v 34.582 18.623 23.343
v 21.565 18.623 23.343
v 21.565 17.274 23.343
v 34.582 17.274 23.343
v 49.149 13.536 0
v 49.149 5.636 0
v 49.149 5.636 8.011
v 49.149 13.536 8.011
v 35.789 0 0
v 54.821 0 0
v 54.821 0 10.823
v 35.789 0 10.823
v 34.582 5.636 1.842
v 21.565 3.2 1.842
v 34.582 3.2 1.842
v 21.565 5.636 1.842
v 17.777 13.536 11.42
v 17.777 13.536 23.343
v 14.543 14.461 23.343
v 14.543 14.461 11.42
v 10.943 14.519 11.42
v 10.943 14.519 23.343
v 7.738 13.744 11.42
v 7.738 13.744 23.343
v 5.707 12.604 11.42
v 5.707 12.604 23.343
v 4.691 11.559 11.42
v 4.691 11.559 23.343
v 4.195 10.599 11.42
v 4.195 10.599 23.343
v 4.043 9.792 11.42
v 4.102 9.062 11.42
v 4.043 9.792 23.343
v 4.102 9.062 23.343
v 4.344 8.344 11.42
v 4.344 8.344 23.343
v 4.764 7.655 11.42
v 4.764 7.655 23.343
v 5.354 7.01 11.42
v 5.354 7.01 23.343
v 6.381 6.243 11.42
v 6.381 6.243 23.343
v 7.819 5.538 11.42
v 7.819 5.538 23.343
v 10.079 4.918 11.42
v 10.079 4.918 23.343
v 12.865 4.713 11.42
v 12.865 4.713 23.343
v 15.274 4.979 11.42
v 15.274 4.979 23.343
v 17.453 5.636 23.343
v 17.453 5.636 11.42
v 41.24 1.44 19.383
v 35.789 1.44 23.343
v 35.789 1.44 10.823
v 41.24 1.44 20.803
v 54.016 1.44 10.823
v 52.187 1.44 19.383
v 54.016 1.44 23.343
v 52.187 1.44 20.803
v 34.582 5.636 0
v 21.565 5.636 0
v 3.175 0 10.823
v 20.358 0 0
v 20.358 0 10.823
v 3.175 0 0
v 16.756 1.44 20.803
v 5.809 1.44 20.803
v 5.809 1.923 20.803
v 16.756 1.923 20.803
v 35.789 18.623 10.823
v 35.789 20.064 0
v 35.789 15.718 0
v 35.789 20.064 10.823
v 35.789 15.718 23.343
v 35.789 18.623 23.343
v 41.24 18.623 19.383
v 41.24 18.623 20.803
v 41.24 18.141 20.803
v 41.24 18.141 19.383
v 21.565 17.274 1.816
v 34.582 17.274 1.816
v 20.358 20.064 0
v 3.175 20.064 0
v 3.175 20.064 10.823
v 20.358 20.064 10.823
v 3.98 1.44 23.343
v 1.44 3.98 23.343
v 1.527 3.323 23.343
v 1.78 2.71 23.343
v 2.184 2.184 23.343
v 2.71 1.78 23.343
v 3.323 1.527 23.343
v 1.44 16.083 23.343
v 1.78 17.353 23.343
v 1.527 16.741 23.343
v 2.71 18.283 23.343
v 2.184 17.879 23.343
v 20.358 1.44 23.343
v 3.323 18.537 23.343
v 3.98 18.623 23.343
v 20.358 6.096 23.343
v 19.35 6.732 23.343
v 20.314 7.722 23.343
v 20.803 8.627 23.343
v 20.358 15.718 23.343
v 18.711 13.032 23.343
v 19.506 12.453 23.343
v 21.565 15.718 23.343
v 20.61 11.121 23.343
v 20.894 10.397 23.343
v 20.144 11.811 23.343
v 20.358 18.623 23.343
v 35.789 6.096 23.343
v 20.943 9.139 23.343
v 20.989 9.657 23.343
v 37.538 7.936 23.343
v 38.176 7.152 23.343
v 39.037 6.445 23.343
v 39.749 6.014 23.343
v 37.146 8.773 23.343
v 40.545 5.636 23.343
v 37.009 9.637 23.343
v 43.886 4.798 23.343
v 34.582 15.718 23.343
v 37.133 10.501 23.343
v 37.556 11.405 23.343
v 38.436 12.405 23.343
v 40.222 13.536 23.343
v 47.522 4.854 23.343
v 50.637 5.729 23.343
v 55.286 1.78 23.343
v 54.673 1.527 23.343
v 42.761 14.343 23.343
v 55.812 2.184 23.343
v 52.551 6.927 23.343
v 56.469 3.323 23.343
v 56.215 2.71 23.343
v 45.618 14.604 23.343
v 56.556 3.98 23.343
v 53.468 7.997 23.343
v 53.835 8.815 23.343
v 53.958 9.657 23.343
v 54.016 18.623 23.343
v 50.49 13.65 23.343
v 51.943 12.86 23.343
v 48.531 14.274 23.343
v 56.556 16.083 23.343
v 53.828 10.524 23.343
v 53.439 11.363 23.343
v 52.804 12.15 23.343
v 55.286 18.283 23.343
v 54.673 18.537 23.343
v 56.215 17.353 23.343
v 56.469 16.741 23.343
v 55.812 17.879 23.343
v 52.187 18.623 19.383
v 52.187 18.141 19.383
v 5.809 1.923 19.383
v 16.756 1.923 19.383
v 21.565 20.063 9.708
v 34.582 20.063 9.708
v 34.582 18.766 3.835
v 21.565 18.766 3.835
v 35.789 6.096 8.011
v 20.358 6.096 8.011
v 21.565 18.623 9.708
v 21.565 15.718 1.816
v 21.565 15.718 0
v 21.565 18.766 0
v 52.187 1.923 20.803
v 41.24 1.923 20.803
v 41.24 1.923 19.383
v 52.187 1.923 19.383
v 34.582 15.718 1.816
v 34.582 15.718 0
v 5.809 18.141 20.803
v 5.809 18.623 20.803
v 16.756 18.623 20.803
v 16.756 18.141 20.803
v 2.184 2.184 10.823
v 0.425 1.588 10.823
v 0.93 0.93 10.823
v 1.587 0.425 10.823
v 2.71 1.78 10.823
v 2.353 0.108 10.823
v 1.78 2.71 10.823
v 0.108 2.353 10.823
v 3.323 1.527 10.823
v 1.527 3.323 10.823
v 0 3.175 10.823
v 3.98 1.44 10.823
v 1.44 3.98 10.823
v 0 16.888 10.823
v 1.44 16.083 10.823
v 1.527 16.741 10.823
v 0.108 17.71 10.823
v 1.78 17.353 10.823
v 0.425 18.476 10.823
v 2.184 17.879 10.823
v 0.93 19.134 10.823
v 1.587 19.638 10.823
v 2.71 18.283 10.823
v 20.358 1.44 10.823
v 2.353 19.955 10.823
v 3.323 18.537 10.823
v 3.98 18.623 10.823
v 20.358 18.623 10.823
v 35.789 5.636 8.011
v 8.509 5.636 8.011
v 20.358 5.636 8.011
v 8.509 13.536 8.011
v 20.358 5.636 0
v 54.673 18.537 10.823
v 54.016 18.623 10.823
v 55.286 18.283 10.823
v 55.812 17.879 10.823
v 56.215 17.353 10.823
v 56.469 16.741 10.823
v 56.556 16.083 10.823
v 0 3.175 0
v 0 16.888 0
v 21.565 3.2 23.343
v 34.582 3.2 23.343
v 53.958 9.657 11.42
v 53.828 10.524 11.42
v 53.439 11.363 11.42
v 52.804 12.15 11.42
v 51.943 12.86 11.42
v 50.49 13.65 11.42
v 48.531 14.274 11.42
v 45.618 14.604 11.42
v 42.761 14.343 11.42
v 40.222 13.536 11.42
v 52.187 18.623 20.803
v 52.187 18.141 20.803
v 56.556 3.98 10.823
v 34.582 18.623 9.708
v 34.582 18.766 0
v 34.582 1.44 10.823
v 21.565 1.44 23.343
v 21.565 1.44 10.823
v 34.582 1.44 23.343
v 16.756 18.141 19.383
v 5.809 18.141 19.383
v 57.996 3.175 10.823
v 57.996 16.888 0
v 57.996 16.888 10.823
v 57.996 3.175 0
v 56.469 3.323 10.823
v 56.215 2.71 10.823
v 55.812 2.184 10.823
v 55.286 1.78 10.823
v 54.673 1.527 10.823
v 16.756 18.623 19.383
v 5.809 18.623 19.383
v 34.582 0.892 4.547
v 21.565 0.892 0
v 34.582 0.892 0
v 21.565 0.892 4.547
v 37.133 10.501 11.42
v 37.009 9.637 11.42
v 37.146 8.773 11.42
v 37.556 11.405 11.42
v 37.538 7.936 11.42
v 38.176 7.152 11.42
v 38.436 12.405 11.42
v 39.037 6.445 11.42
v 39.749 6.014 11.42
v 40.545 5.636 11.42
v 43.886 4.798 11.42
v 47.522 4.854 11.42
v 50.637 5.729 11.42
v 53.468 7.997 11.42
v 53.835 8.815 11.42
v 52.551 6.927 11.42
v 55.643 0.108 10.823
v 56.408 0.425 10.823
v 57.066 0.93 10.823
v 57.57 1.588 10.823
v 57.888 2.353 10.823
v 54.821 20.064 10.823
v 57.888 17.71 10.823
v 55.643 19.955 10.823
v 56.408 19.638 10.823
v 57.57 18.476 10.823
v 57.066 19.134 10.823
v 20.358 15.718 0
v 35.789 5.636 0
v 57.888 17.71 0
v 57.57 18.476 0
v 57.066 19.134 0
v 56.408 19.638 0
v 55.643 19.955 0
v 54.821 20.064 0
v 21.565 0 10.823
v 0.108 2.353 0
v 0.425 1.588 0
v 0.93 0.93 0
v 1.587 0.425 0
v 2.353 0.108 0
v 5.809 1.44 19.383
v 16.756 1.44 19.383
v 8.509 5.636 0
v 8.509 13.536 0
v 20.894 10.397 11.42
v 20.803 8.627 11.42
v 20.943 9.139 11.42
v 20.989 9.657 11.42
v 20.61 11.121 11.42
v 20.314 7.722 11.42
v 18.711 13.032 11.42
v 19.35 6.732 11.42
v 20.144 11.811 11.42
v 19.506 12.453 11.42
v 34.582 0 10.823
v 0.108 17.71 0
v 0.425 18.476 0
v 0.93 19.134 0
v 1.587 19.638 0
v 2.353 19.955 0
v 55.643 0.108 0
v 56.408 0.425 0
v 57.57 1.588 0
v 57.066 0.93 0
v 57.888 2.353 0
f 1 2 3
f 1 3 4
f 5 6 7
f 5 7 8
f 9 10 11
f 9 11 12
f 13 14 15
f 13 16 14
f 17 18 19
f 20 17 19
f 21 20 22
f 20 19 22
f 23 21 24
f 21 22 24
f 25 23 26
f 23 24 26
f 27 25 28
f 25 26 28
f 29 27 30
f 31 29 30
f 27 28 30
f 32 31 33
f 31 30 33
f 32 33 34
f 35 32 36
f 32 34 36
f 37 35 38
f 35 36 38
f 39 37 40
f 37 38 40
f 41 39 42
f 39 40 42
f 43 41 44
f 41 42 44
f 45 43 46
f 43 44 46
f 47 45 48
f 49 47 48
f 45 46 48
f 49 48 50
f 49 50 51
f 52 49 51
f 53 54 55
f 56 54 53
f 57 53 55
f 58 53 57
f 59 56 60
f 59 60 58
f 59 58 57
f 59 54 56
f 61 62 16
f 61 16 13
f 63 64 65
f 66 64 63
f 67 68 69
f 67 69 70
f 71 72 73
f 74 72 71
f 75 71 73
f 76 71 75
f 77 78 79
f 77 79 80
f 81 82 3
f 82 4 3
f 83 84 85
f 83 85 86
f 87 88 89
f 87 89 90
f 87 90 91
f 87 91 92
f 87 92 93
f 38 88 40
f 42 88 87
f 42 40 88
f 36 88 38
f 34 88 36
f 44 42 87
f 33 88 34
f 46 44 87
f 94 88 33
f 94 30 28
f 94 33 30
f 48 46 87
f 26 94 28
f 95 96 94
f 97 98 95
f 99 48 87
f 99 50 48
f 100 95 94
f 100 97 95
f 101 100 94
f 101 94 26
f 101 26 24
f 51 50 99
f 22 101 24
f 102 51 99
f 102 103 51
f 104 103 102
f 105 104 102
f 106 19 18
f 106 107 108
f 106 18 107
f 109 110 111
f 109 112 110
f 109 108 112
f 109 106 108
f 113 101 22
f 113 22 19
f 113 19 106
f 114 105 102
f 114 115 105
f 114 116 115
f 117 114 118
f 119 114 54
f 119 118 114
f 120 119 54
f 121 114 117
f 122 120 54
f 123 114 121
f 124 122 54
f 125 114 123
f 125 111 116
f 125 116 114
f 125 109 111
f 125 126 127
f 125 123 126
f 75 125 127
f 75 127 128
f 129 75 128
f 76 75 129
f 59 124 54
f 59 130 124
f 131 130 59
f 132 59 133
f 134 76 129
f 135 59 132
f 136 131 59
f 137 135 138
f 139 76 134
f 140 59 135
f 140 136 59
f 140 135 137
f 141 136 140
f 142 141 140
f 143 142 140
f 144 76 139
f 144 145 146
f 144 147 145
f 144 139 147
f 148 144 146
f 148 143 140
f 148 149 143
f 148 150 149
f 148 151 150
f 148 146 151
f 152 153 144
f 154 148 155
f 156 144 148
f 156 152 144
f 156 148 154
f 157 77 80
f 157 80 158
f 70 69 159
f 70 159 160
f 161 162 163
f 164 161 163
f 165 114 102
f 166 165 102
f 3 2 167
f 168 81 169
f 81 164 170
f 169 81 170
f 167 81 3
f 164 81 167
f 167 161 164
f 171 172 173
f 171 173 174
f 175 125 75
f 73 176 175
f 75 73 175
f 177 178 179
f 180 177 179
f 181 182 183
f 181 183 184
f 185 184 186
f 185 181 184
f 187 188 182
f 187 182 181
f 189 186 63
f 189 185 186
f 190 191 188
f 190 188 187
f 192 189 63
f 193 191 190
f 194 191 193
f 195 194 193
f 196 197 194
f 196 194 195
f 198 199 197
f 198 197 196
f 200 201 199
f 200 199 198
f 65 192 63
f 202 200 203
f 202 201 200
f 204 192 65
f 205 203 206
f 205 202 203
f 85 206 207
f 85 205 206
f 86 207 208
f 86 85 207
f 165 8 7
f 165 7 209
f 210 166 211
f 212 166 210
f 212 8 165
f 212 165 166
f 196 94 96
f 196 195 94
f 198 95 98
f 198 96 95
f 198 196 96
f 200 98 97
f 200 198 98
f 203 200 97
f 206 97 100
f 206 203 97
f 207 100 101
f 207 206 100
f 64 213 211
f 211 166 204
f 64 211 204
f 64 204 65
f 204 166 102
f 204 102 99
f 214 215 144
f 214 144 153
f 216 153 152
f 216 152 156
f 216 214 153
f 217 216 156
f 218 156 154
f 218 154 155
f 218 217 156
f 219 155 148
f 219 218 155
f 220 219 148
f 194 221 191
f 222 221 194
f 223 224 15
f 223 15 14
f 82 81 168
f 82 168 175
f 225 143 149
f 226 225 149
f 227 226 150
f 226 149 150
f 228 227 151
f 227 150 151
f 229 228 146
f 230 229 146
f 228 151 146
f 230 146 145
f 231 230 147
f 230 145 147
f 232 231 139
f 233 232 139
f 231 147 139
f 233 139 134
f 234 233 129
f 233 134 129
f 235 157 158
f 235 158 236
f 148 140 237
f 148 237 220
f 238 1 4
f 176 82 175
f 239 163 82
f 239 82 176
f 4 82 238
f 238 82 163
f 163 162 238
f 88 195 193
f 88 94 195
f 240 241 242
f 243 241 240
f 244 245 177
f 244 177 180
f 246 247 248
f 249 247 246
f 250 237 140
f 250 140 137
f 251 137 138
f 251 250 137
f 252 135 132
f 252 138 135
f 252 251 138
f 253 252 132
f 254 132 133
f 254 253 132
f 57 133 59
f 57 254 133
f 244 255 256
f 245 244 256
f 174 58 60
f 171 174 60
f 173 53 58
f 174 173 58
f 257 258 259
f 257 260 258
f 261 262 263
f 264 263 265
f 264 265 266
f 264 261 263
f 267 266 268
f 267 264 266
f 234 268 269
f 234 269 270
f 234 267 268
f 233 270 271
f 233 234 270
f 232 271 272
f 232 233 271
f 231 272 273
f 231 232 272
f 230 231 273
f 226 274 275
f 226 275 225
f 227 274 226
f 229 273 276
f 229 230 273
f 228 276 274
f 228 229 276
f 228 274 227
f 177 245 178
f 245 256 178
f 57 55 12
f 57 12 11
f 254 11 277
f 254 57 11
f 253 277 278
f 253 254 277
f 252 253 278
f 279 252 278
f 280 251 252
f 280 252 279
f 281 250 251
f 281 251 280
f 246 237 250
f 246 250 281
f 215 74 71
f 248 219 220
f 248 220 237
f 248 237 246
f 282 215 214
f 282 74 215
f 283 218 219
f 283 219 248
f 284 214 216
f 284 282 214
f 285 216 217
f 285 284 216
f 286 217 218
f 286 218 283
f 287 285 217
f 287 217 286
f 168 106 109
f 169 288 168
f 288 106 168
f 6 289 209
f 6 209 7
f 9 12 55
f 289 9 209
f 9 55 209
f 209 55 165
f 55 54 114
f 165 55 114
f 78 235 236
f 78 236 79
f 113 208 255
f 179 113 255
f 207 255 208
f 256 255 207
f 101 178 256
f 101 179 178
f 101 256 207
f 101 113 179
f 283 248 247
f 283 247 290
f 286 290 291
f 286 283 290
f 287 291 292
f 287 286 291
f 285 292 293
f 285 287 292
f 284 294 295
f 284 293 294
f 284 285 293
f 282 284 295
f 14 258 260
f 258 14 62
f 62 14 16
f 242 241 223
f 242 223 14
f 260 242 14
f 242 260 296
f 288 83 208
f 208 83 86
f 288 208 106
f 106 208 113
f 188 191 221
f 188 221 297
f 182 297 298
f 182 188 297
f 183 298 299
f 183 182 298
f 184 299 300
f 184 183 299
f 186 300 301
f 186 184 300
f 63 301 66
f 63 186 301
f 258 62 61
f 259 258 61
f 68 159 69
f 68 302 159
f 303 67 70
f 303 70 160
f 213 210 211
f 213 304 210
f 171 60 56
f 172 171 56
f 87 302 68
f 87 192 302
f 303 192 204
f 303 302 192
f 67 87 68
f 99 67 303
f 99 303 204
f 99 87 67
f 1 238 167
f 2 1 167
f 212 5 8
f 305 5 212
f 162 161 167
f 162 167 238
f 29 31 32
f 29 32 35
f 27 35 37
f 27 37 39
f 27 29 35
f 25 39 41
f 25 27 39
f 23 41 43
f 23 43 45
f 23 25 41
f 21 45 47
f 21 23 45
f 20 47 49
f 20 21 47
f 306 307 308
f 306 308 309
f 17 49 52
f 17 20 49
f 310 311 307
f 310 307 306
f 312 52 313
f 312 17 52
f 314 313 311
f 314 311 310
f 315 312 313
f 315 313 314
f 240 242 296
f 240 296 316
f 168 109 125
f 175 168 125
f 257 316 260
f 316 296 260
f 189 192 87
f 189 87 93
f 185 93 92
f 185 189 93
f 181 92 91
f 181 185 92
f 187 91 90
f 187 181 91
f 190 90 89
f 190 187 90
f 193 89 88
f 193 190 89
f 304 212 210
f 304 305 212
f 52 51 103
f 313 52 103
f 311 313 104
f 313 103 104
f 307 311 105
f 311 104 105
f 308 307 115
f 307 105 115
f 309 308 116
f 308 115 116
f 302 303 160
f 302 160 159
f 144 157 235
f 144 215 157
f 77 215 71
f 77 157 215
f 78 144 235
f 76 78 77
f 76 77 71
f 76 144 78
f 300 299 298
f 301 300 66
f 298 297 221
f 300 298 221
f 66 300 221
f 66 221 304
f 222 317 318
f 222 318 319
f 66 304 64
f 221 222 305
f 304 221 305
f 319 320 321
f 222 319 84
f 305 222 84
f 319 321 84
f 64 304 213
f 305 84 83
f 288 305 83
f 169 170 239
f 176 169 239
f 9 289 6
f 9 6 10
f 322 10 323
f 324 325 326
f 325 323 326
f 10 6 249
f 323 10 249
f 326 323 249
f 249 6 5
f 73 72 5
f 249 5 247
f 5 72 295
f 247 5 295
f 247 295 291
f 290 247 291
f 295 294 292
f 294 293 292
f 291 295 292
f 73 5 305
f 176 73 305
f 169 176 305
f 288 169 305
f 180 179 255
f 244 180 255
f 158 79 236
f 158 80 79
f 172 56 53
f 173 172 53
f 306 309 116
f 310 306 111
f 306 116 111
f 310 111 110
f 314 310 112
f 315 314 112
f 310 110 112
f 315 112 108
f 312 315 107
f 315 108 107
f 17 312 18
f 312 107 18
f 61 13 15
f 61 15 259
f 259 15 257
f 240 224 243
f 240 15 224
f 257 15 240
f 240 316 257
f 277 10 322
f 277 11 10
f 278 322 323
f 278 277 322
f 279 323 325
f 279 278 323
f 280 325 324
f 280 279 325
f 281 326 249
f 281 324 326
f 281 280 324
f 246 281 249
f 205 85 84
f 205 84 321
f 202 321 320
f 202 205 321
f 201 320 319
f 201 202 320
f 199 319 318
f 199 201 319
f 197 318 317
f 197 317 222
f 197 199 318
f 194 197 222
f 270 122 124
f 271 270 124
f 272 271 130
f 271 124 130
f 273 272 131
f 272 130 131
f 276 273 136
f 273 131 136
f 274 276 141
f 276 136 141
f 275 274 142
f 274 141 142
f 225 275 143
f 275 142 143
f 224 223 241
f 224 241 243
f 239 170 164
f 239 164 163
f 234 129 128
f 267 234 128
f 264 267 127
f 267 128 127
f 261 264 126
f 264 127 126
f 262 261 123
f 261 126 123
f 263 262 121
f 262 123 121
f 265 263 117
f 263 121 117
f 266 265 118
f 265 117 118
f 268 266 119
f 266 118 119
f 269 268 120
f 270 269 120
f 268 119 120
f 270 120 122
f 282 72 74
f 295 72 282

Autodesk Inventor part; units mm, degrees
ref_plane "YZ Plane" through (0, 0, 0) normal (1, 0, 0) x (0, 1, 0)
ref_plane "XZ Plane" through (0, 0, 0) normal (0, 1, 0) x (-1, 0, 0)
ref_plane "XY Plane" through (0, 0, 0) normal (0, 0, 1) x (1, 0, 0)
sketch "Sketch1" plane through (0, 0, 0) normal (0, 0, 1) x (1, 0, 0)
  line L0 (0, 20.0635) -> (57.9958, 20.0635)
  line L1 (57.9958, 20.0635) -> (57.9958, 0)
  line L2 (57.9958, 0) -> (0, 0)
  line L3 (0, 0) -> (0, 20.0635)
  dimension "d0" = 57.9958
  dimension "d1" = 20.0635
extrude "Extrusion1" add sketch "Sketch1" along normal blind 23.3426
sketch "Sketch2" plane through (0, 0, 23.3426) normal (0, 0, 1) x (1, 0, 0)
  line L0 (0, 20.0635) -> (57.9958, 20.0635)
  line L1 (57.9958, 20.0635) -> (57.9958, 0)
  line L2 (57.9958, 0) -> (0, 0)
  line L3 (0, 0) -> (0, 20.0635)
  line L4 (56.5556, 18.6233) -> (1.4402, 18.6233)
  line L5 (1.4402, 18.6233) -> (1.4402, 1.4402)
  line L6 (1.4402, 1.4402) -> (56.5556, 1.4402)
  line L7 (56.5556, 1.4402) -> (56.5556, 18.6233)
  point P0 (0, 0)
  dimension "d4" = 1.4402
extrude "Extrusion2" cut sketch "Sketch2" against normal blind 12.5197
sketch "Sketch3" plane through (1.4402, 18.6233, 23.3426) normal (0, 1, 0) x (1, 0, 0)
  line L0 (0, 0) -> (0, 12.5197) construction
  line L1 (4.3688, 0) -> (4.3688, 2.54) construction
  line L2 (0, 0) -> (55.1155, 0) construction
  line L3 (4.3688, 2.54) -> (15.3162, 2.54)
  line L4 (15.3162, 2.54) -> (15.3162, 3.9599)
  line L5 (15.3162, 3.9599) -> (4.3688, 3.9599)
  line L6 (4.3688, 3.9599) -> (4.3688, 2.54)
  line L7 (55.1155, 0) -> (55.1155, 12.5197) projected
  line L8 (50.7467, 2.54) -> (39.7993, 2.54)
  line L9 (39.7993, 2.54) -> (39.7993, 3.9599)
  line L10 (39.7993, 3.9599) -> (50.7467, 3.9599)
  line L11 (50.7467, 3.9599) -> (50.7467, 2.54)
  point P0 (-1.4402, 23.3426)
  dimension "d9" = 4.3688
  dimension "d10" = 2.54
  dimension "d11" = 10.9474
  dimension "d12" = 1.4199
  dimension "d15" = 2.54
  dimension "d16" = 4.3688
  dimension "d17" = 10.9474
  dimension "d18" = 1.4199
extrude "Extrusion3" cut sketch "Sketch3" against normal blind 0.4826 contours L6 L5 L4 L3
extrude "Extrusion4" cut sketch "Sketch3" against normal blind 0.4826 contours L8 L9 L10 L11
sketch "Sketch4" plane through (1.4402, 1.4402, 23.3426) normal (0, -1, 0) x (1, 0, 0)
  line L0 (50.7467, -2.54) -> (39.7993, -2.54)
  line L1 (39.7993, -2.54) -> (39.7993, -3.9599)
  line L2 (39.7993, -3.9599) -> (50.7467, -3.9599)
  line L3 (50.7467, -3.9599) -> (50.7467, -2.54)
  line L4 (4.3688, -2.54) -> (15.3162, -2.54)
  line L5 (15.3162, -2.54) -> (15.3162, -3.9599)
  line L6 (15.3162, -3.9599) -> (4.3688, -3.9599)
  line L7 (4.3688, -3.9599) -> (4.3688, -2.54)
  point P0 (-1.4402, -23.3426)
extrude "Extrusion5" cut sketch "Sketch4" against normal blind 0.4826
sketch "Sketch5" plane through (0, 0, 0) normal (0, 0, -1) x (-1, 0, 0)
  line L0 (-49.149, 13.5356) -> (-8.509, 13.5356)
  line L1 (-8.509, 13.5356) -> (-8.509, 5.6362)
  line L2 (-8.509, 5.6362) -> (-49.149, 5.6362)
  line L3 (-49.149, 5.6362) -> (-49.149, 13.5356)
  line L4 (0, 0) -> (0, 20.0635) projected
  dimension "d23" = 40.64
  dimension "d24" = 8.509
  dimension "d25" = 7.8994
extrude "Extrusion6" cut sketch "Sketch5" against normal blind 8.0112
sketch "Sketch6" plane through (0, 20.0635, 0) normal (0, 1, 0) x (1, 0, 0)
  line L0 (21.5646, 1.939) -> (20.3581, 1.939)
  line L1 (20.3581, 1.939) -> (20.3581, -30.94)
  line L2 (20.3581, -30.94) -> (21.5646, -30.94)
  line L3 (21.5646, -30.94) -> (21.5646, 1.939)
  line L4 (34.5821, 1.939) -> (35.7886, 1.939)
  line L5 (35.7886, 1.939) -> (35.7886, -30.94)
  line L6 (35.7886, -30.94) -> (34.5821, -30.94)
  line L7 (34.5821, -30.94) -> (34.5821, 1.939)
  line L8 (1.4402, -23.3426) -> (1.4402, -10.8229) projected
  point P0 (0, 0)
  dimension "d28" = 20.1244
  dimension "d29" = 1.2065
  dimension "d30" = 13.0175
  dimension "d31" = 1.2065
extrude "Extrusion7" cut sketch "Sketch6" against normal blind 4.3459
sketch "Sketch7" plane through (0, 0, 10.8229) normal (0, 0, 1) x (1, 0, 0)
  line L0 (21.5646, 20.0635) -> (34.5821, 20.0635)
  line L1 (34.5821, 20.0635) -> (34.5821, 18.6233)
  line L2 (34.5821, 18.6233) -> (21.5646, 18.6233)
  line L3 (21.5646, 18.6233) -> (21.5646, 20.0635)
  point P0 (0, 0)
extrude "Extrusion8" cut sketch "Sketch7" against normal blind 1.1151
sketch "Sketch8" plane through (21.5646, 20.0635, 0) normal (0, 1, 0) x (1, 0, 0)
  line L0 (13.0175, -9.7079) -> (13.0175, 0) projected
  line L1 (0, 0) -> (13.0175, 0)
  line L2 (13.0175, 0) -> (13.0175, -3.8354)
  line L3 (13.0175, -3.8354) -> (0, -3.8354)
  line L4 (0, -3.8354) -> (0, 0)
  point P0 (-21.5646, 0)
  dimension "d36" = 3.8354
extrude "Extrusion9" cut sketch "Sketch8" against normal blind 1.2979
sketch "Sketch10" plane through (0, 0, 23.3426) normal (0, 0, 1) x (1, 0, 0)
  ellipse E0 centre (12.5146, 9.6571) end of major axis (20.9893, 9.6571) minor radius 4.9479
  line L0 (0, 0) -> (0, 20.0635) projected
  line L1 (1.4402, 18.6233) -> (1.4402, 1.4402) projected
  line L2 (49.149, 13.5356) -> (8.509, 13.5356) projected
  line L3 (20.3581, 18.6233) -> (1.4402, 18.6233) projected
  ellipse E1 centre (45.4838, 9.6571) end of major axis (53.9585, 9.6571) minor radius 4.9479
  line L4 (8.509, 5.6362) -> (49.149, 5.6362) projected
  line L5 (35.7886, 20.0635) -> (57.9958, 20.0635) projected
  line L6 (56.5556, 18.6233) -> (35.7886, 18.6233) projected
  dimension "d41" = 8.4747
  dimension "d43" = 4.9479
  dimension "d51" = 4.9479
  dimension "d52" = 8.4747
  dimension "d44" = 11.0744
  dimension "d45" = 8.9662
  dimension "d49" = 32.9692
  dimension "d53" = 8.9662
extrude "Extrusion10" cut sketch "Sketch10" against normal blind 11.9228 contours E0 | E1
sketch "Sketch11" plane through (0, 0, 23.3426) normal (0, 0, 1) x (1, 0, 0)
  line L0 (34.5821, 15.7175) -> (34.5821, 18.6233) projected
  line L1 (21.5646, 15.7175) -> (34.5821, 15.7175)
  line L2 (34.5821, 15.7175) -> (34.5821, 17.2745)
  line L3 (34.5821, 17.2745) -> (21.5646, 17.2745)
  line L4 (21.5646, 17.2745) -> (21.5646, 15.7175)
  line L5 (34.5821, 18.6233) -> (21.5646, 18.6233) projected
  point P0 (0, 0)
  dimension "d57" = 1.3487
extrude "Extrusion11" cut sketch "Sketch11" against normal blind 21.5265
sketch "Sketch12" plane through (34.5821, 18.6233, 9.7079) normal (1, 0, 0) x (0, 0, -1)
  line L0 (0, 1.4402) -> (5.8725, 0.1422)
  line L1 (5.8725, 0.1422) -> (5.8725, 1.4402)
  line L2 (9.7079, 1.4402) -> (-1.1151, 1.4402) projected
  line L3 (5.8725, 1.4402) -> (0, 1.4402)
  point P0 (9.7079, -18.6233)
extrude "Extrusion12" cut sketch "Sketch12" against normal up to next
sketch "Sketch13" plane through (0, 0, 23.3426) normal (0, 0, 1) x (1, 0, 0)
  line L0 (1.4402, 18.6233) -> (1.4402, 1.4402) construction
  point P0 (0, 0)
sketch "Sketch14" plane through (0, 0, 23.3426) normal (0, 0, 1) x (1, 0, 0)
  line L0 (35.7886, 6.096) -> (34.5821, 6.096)
  line L1 (34.5821, 6.096) -> (34.5821, -2.3095)
  line L2 (34.5821, -2.3095) -> (35.7886, -2.3095)
  line L3 (35.7886, -2.3095) -> (35.7886, 6.096)
  line L4 (21.5646, 6.096) -> (20.3581, 6.096)
  line L5 (20.3581, 6.096) -> (20.3581, -4.7581)
  line L6 (20.3581, -4.7581) -> (21.5646, -4.7581)
  line L7 (21.5646, -4.7581) -> (21.5646, 6.096)
  line L8 (1.4402, 1.4402) -> (56.5556, 1.4402) projected
  point P0 (0, 0)
  dimension "d62" = 4.6558
  dimension "d63" = 4.6558
extrude "Extrusion13" cut sketch "Sketch14" against normal blind 2514.6
sketch "Sketch15" plane through (21.5646, 0, 0) normal (0, -1, 0) x (1, 0, 0)
  line L0 (13.0175, 0) -> (0.1116, 0)
  line L1 (13.0175, 10.8229) -> (0, 10.8229) projected
  line L2 (13.0175, 0) -> (0, 0)
  line L3 (0, 0) -> (0, 4.5466)
  line L4 (0, 4.5466) -> (13.0175, 4.5466)
  line L5 (13.0175, 4.5466) -> (13.0175, 0)
  line L6 (0, 10.8229) -> (0, 0) projected
  point P0 (-21.5646, 0)
  dimension "d67" = 4.5466
extrude "Extrusion14" cut sketch "Sketch15" against normal blind 0.8915
sketch "Sketch16" plane through (21.5646, 1.4402, 23.3426) normal (-1, 0, 0) x (0, 0, 1)
  line L0 (-12.5197, -1.4402) -> (-18.796, -0.5486)
  line L1 (-18.796, -0.5486) -> (-18.796, -1.4402)
  line L2 (-18.796, -1.4402) -> (-12.5197, -1.4402)
  line L3 (-12.5197, -1.4402) -> (-18.796, -1.4402) projected
  point P0 (-23.3426, -1.4402)
extrude "Extrusion15" cut sketch "Sketch16" against normal up to next
sketch "Sketch17" plane through (0, 0, 23.3426) normal (0, 0, 1) x (1, 0, 0)
  line L0 (21.5646, 6.096) -> (34.5821, 6.096)
  line L1 (34.5821, 6.096) -> (34.5821, 3.2004)
  line L2 (34.5821, 3.2004) -> (21.5646, 3.2004)
  line L3 (21.5646, 3.2004) -> (21.5646, 6.096)
  point P0 (0, 0)
  dimension "d72" = 2.8956
extrude "Extrusion16" cut sketch "Sketch17" against normal blind 21.5011
fillet "Fillet1" radius 2.54 4 edges at (56.5556, 18.6233, 17.0828) (1.4402, 18.6233, 17.0828) (1.4402, 1.4402, 17.0828) (56.5556, 1.4402, 17.0828)
fillet "Fillet2" radius 3.175 4 edges at (57.9958, 20.0635, 5.4115) (0, 20.0635, 5.4115) (57.9958, 0, 5.4115) (0, 0, 5.4115)
equation "\"d16\" = d9"
equation "\"d17\" = d11"
equation "\"d18\" = d12"
equation "\"d31\" = d29"
equation "\"d51\" = d43"
equation "\"d52\" = d41"
equation "\"d53\" = d45"
equation "\"d63\" = d62"
properties part number "Connector Piece"
